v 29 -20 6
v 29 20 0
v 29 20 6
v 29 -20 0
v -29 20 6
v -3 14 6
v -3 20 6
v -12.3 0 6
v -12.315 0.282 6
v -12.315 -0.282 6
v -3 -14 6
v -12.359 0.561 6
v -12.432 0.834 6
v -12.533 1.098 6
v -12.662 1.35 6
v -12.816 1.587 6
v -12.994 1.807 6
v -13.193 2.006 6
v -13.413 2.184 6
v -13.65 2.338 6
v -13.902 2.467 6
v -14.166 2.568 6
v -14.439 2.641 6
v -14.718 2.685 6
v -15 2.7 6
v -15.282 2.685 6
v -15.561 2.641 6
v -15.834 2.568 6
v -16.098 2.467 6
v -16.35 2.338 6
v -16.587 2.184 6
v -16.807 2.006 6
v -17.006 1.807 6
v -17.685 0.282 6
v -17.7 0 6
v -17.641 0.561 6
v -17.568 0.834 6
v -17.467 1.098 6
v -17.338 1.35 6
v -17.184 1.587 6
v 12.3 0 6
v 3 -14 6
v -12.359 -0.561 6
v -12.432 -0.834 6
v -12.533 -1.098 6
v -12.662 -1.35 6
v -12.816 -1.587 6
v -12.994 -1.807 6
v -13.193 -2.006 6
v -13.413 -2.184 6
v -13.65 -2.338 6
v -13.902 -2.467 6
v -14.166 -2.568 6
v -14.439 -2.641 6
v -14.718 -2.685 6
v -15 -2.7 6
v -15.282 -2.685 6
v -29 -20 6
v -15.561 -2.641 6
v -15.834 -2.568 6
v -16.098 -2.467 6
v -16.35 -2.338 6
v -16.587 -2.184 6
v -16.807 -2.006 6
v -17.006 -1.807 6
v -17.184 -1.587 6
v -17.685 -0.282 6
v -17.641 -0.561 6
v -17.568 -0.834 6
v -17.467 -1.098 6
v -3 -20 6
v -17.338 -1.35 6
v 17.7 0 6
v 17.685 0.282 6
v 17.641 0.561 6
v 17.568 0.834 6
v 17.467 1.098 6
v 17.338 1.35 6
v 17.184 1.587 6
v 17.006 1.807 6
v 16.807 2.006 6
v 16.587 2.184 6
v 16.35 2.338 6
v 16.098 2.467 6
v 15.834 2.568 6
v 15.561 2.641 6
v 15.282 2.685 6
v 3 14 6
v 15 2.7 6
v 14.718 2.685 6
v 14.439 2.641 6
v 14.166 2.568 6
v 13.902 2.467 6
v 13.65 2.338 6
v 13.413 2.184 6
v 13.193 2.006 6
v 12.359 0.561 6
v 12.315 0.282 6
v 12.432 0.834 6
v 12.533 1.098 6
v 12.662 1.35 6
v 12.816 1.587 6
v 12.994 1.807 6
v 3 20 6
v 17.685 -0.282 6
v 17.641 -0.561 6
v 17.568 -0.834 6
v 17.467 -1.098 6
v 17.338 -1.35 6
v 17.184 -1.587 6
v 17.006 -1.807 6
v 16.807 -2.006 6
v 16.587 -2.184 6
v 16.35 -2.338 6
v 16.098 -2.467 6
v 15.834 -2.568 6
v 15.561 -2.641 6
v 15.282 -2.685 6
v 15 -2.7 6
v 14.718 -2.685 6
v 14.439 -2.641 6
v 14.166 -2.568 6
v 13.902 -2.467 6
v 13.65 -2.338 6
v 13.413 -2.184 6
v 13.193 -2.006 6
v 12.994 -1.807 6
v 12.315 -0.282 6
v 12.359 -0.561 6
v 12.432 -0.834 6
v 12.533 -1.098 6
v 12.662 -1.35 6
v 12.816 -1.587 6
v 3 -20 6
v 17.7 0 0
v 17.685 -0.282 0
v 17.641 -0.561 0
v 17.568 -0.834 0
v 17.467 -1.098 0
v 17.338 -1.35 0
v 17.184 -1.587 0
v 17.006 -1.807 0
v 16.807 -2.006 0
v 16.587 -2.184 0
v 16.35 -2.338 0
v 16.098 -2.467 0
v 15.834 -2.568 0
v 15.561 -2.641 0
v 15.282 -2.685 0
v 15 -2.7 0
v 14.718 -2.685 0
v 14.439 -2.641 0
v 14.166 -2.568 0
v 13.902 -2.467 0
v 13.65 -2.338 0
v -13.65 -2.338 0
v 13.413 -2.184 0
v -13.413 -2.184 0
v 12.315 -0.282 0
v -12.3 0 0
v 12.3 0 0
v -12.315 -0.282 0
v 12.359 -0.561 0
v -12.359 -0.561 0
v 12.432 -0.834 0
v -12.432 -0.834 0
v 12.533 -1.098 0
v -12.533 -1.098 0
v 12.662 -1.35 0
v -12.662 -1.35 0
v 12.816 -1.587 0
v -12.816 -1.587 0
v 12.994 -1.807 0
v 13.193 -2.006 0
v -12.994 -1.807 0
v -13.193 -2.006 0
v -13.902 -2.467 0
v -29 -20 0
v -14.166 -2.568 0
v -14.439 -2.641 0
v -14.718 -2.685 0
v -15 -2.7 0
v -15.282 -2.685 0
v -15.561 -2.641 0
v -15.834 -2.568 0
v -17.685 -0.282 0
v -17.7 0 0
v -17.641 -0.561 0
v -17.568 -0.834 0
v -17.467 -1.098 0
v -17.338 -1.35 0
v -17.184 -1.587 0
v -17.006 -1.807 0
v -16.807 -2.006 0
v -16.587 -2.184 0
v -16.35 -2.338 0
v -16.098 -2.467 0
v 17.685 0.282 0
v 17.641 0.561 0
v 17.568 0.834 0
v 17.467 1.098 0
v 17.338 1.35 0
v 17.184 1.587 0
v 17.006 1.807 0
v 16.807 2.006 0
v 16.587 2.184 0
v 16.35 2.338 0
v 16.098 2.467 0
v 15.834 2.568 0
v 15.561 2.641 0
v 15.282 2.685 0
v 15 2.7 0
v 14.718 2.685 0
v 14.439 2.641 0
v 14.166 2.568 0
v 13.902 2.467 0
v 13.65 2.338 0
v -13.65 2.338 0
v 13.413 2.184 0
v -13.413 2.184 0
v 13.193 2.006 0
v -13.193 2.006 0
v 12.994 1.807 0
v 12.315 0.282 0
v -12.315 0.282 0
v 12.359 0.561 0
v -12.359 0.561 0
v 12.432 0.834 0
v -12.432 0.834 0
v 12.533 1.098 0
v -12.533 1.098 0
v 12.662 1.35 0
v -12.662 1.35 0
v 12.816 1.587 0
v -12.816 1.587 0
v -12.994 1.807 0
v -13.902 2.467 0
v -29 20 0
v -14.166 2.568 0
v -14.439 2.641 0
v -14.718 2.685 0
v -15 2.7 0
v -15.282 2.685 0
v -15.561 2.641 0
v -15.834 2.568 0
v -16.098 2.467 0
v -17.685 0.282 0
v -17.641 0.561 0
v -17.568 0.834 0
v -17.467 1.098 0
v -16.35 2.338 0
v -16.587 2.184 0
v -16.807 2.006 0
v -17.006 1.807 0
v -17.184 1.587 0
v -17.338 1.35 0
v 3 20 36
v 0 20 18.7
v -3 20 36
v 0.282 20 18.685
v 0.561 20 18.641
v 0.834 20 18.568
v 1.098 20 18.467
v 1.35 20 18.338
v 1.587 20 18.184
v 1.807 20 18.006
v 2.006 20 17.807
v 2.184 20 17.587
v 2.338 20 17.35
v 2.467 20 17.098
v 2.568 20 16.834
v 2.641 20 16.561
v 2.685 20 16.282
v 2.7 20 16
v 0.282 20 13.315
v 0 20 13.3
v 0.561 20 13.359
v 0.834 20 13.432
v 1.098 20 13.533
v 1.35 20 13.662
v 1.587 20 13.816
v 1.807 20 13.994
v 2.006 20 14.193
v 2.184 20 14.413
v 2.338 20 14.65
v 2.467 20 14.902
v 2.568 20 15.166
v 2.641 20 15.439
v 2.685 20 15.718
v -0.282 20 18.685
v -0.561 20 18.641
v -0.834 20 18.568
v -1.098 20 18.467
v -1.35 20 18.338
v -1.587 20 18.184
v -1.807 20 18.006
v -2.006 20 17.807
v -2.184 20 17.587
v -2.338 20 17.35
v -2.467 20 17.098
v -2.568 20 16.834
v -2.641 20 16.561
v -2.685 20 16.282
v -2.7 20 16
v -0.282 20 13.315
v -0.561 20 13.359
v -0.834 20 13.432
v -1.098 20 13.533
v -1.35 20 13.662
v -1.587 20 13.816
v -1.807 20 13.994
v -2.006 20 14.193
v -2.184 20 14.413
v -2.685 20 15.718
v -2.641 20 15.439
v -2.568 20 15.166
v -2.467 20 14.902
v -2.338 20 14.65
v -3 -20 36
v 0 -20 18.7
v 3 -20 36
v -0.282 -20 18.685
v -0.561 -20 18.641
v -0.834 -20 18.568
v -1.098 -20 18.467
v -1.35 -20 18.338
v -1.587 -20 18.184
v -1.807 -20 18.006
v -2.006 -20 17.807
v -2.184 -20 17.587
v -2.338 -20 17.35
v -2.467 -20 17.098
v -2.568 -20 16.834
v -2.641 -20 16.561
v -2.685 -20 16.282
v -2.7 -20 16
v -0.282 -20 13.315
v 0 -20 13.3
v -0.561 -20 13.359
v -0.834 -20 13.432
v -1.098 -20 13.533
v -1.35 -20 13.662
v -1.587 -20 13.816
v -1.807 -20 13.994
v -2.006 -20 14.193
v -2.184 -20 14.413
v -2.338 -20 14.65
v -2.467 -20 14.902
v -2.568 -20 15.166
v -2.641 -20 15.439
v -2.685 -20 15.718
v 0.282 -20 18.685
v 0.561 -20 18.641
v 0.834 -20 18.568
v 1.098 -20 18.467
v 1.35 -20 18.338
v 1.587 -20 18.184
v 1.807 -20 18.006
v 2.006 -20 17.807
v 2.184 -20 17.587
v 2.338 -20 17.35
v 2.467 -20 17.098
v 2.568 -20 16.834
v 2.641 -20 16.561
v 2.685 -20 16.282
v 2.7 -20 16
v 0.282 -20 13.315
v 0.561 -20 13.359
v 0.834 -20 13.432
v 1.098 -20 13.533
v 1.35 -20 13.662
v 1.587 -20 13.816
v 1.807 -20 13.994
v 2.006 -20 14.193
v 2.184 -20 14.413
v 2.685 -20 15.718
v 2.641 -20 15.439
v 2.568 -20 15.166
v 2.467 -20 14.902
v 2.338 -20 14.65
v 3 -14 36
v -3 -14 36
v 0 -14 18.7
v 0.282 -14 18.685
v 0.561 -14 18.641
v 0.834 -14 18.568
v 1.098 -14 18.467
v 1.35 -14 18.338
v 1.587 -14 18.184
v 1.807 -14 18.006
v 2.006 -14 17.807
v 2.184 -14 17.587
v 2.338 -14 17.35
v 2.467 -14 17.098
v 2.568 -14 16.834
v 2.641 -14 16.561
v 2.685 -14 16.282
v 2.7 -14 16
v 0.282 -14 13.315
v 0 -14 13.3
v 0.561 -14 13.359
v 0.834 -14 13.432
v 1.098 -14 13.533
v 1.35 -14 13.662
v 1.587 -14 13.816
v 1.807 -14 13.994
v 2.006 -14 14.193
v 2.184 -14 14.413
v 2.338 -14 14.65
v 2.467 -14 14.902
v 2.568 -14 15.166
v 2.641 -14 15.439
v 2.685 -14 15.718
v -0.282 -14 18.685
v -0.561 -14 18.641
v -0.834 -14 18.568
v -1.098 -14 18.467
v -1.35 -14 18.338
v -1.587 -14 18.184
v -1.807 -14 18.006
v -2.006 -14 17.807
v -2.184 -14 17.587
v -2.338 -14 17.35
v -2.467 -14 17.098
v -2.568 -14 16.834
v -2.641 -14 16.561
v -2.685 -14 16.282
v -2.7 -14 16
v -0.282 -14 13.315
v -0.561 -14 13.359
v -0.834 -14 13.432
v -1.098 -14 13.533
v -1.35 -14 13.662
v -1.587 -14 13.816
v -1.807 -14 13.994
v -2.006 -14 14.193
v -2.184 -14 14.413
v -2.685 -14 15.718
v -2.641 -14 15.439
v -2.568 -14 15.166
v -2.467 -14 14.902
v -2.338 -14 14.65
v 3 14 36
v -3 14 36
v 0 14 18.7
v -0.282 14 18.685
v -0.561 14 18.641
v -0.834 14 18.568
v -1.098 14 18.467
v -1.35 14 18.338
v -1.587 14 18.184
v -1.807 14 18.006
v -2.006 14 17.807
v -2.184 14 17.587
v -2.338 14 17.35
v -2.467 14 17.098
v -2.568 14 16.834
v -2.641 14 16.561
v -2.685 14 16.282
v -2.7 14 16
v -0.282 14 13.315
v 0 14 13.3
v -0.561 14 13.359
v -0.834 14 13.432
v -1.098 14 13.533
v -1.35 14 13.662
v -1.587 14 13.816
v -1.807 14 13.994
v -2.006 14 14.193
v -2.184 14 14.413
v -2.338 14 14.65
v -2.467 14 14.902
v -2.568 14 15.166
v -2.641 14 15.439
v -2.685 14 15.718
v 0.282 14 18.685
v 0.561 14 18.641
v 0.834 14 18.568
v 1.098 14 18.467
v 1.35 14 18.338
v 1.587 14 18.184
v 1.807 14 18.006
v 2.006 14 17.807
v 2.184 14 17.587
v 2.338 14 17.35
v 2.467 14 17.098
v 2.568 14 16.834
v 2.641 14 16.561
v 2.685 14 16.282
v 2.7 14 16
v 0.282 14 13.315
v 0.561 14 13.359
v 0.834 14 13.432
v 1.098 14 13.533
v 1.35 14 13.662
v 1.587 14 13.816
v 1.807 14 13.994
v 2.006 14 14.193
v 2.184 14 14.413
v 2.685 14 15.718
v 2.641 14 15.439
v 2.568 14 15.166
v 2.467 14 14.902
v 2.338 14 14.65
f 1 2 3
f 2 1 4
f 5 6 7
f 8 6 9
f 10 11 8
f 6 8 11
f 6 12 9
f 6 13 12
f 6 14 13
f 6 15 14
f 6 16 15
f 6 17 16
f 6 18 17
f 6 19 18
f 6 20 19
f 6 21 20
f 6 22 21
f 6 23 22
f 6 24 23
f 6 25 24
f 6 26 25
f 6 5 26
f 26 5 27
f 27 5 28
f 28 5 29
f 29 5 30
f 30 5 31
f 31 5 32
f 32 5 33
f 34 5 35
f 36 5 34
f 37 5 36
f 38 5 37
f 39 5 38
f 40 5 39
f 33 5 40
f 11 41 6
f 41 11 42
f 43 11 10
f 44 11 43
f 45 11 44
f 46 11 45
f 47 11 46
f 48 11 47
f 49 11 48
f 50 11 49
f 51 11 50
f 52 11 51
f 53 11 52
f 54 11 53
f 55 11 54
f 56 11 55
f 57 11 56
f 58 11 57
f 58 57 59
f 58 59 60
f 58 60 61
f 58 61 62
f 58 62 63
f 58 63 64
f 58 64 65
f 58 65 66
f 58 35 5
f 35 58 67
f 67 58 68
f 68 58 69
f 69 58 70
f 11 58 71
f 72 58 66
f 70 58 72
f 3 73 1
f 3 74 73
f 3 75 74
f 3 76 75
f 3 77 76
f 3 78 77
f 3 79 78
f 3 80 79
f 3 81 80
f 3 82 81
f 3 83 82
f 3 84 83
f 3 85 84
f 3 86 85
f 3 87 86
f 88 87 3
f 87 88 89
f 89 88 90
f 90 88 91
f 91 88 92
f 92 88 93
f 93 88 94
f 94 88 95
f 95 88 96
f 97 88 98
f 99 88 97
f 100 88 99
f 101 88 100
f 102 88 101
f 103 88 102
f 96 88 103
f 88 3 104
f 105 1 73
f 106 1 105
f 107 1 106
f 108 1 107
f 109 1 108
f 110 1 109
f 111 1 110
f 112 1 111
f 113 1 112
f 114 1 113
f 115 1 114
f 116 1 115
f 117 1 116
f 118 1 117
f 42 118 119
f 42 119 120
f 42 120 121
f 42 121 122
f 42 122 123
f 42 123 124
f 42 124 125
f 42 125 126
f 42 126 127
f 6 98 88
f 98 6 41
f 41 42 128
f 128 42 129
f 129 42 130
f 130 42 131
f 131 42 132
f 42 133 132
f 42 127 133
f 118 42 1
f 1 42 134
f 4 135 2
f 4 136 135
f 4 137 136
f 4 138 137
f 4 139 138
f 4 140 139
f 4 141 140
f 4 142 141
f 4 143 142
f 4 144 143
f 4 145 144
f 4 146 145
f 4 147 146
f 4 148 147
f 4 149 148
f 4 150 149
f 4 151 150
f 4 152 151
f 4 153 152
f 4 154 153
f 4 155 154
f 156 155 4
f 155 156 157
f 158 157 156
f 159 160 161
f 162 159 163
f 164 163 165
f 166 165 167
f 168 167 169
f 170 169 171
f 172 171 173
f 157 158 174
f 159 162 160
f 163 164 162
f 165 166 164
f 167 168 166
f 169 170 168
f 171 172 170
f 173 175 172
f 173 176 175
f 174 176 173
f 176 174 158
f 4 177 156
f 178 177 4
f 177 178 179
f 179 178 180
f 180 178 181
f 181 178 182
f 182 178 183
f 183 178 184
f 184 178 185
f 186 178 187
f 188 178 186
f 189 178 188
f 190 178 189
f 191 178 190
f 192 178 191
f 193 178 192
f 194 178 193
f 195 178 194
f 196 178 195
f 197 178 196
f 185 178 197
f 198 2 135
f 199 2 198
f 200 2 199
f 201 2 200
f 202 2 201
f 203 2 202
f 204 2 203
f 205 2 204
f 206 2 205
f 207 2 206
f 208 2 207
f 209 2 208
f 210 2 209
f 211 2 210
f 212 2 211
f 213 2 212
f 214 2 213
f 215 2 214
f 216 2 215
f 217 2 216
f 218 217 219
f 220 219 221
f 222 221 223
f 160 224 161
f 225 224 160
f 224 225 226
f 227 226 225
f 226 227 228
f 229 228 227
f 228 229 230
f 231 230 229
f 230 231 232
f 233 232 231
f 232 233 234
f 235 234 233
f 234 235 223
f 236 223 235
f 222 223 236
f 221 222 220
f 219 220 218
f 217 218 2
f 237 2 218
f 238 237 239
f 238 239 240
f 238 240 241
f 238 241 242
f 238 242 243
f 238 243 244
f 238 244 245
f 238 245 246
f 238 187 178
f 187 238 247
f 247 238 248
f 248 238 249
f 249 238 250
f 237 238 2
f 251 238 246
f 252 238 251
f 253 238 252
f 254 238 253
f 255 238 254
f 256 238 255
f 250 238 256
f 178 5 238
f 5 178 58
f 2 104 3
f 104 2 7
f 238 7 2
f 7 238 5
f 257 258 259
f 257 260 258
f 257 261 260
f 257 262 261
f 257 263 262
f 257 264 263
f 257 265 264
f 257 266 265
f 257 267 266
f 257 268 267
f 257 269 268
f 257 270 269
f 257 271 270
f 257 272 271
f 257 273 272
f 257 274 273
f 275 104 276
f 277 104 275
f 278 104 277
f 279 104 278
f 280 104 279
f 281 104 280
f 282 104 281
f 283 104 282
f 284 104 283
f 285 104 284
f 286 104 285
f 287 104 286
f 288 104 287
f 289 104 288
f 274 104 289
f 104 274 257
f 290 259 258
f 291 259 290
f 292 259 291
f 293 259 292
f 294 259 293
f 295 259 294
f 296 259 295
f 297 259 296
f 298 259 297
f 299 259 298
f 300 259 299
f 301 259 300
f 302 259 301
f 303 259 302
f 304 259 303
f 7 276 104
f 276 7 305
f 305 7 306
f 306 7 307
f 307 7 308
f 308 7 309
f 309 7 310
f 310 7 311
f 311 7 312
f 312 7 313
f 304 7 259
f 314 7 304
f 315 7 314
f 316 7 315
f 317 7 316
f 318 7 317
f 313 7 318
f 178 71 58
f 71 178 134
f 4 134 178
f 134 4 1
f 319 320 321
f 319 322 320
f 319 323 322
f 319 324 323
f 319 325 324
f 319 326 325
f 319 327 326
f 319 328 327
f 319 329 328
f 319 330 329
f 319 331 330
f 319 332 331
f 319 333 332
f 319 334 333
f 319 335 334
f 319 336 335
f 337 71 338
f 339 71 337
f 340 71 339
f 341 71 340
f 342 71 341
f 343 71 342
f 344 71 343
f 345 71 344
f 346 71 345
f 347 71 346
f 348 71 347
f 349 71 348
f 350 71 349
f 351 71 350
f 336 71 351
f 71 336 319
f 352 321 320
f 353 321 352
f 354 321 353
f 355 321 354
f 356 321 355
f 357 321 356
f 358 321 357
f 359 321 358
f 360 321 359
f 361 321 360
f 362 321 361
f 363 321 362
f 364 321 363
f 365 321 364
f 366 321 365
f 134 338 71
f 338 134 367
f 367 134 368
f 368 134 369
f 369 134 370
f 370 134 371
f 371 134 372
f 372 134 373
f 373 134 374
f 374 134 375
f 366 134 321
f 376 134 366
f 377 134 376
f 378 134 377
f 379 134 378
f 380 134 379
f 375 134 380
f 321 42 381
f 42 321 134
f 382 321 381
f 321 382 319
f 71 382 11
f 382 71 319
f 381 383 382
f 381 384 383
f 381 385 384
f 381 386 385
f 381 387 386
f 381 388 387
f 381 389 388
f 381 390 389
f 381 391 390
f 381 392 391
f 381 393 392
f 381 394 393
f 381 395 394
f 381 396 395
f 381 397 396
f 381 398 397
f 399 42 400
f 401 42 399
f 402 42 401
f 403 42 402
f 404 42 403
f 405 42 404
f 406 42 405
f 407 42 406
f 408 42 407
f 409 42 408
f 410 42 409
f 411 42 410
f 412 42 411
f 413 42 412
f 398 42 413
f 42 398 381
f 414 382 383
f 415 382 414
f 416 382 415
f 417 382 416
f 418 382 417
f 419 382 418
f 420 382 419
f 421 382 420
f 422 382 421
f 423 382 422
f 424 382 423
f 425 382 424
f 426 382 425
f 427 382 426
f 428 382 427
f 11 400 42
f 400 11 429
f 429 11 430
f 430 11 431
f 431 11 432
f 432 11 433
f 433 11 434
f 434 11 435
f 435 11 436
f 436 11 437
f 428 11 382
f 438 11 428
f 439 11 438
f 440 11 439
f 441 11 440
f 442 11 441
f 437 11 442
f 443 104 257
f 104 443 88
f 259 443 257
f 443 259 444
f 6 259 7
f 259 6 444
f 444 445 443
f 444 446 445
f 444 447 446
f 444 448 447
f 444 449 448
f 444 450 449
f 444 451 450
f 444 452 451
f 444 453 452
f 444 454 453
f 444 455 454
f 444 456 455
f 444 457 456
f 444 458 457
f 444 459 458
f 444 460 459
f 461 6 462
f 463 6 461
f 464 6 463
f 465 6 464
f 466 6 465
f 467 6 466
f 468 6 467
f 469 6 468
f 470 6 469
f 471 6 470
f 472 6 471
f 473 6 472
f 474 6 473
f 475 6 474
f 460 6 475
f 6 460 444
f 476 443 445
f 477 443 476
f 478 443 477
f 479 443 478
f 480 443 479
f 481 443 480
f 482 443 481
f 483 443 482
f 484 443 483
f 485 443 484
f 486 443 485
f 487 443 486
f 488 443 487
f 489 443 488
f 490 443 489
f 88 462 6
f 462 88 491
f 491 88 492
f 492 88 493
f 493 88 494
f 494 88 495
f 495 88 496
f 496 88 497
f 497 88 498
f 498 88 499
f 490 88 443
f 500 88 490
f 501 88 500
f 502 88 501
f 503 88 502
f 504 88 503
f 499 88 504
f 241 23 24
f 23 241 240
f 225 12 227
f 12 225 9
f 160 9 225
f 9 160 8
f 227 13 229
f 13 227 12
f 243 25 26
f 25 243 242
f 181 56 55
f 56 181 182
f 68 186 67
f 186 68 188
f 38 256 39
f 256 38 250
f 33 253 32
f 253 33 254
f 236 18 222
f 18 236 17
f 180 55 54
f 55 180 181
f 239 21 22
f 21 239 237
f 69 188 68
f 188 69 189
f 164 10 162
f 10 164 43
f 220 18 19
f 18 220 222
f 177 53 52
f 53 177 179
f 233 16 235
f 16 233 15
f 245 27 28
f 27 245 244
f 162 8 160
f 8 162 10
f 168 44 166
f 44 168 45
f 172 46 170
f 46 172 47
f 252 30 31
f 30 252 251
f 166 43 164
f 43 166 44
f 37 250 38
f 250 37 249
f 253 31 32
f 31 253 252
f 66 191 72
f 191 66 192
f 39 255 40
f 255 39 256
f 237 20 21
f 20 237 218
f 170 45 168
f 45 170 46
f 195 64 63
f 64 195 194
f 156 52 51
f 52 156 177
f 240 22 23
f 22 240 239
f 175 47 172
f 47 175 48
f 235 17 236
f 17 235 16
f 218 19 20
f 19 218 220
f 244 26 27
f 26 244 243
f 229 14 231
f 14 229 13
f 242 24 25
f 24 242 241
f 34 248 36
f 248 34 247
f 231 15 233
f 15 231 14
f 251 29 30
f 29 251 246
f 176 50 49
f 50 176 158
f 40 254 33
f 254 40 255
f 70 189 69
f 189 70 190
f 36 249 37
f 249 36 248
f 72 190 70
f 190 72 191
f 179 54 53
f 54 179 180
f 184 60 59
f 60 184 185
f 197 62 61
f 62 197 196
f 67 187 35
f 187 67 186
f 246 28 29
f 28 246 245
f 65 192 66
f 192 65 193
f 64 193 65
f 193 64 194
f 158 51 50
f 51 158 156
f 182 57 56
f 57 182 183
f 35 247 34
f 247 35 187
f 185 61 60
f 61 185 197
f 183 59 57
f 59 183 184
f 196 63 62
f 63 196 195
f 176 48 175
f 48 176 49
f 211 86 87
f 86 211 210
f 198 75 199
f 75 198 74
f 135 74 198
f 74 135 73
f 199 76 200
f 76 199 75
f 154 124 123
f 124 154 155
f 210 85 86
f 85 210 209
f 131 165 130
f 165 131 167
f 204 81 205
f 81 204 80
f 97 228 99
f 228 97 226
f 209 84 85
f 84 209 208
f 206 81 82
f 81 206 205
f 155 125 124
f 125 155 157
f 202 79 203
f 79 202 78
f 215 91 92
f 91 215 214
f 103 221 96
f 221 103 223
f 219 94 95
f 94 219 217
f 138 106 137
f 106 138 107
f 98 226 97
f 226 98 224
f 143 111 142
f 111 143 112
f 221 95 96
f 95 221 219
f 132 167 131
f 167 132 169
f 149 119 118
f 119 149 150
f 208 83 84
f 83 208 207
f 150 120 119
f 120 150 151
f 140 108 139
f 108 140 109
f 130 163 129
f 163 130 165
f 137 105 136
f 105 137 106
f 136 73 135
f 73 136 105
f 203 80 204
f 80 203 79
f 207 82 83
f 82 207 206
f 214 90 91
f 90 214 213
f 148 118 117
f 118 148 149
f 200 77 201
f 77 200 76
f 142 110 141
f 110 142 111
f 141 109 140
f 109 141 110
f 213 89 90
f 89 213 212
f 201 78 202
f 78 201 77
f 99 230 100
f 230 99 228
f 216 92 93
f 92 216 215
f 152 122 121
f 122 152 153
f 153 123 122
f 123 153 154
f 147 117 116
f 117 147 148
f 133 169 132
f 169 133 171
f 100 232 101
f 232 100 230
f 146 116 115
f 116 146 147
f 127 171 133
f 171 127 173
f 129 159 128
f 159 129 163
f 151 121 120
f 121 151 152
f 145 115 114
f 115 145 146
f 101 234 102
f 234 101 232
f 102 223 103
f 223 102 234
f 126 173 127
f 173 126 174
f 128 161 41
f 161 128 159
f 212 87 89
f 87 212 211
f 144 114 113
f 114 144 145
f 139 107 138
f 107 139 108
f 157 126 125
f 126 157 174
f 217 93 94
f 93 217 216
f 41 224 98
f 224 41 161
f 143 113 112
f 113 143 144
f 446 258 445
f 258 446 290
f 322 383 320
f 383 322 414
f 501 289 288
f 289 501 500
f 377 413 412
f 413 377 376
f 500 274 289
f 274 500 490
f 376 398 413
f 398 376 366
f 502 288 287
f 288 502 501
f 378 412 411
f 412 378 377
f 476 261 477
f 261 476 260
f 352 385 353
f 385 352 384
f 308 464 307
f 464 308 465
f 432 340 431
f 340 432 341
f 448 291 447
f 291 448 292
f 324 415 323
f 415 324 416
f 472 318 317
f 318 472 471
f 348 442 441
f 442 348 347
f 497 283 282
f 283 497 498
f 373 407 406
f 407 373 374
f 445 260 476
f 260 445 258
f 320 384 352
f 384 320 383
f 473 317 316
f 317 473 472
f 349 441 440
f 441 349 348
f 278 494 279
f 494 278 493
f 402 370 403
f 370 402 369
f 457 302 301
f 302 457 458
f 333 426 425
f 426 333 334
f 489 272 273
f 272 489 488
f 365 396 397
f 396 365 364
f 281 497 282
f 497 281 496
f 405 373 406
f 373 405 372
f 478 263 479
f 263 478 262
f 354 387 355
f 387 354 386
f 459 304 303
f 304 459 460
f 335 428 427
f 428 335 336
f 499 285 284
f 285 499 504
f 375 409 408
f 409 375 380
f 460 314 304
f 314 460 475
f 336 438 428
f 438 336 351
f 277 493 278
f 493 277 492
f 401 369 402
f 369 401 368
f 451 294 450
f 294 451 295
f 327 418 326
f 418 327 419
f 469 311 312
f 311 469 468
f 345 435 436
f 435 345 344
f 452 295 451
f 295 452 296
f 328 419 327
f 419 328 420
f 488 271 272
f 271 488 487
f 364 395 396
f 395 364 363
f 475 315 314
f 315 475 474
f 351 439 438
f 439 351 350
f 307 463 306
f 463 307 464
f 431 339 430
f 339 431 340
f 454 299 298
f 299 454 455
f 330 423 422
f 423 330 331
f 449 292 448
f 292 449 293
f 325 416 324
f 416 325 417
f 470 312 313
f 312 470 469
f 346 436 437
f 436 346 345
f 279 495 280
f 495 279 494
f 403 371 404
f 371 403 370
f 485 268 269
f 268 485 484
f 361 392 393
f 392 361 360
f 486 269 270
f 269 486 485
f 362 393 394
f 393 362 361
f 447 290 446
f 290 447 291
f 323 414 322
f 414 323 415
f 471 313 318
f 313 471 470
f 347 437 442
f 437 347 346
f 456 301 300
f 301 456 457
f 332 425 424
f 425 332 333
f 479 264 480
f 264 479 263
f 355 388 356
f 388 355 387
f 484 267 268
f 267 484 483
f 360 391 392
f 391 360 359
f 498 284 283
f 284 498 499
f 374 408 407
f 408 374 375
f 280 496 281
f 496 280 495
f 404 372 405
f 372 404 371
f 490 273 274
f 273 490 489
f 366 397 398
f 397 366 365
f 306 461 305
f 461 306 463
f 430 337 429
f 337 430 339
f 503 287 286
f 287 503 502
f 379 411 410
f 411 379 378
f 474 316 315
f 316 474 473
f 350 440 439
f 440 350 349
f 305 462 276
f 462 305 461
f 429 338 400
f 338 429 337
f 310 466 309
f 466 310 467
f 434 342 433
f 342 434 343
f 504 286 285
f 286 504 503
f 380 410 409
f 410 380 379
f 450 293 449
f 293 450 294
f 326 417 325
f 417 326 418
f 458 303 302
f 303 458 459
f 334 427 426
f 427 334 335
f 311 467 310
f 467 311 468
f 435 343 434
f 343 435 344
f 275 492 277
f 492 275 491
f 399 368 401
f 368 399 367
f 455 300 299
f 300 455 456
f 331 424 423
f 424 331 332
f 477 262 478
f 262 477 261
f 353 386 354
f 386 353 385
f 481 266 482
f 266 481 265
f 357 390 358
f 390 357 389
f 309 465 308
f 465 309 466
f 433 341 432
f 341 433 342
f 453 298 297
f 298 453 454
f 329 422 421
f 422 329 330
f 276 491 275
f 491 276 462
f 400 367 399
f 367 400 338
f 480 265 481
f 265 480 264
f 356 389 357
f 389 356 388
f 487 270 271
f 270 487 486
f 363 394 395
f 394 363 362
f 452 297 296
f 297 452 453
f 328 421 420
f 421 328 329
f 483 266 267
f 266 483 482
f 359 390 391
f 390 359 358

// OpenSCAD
// Clevis mounting bracket for M5 pin.
$fn = 60;
eps = 0.02;
opening = 28;
ear_h = 32;
base_l = 58;
base_w = opening + 12;
base_t = 6;
ear_t = 6;
difference() {
    union() {
        translate([-base_l / 2, -base_w / 2, 0]) cube([base_l, base_w, base_t]);
        translate([-ear_t / 2, -base_w / 2, base_t - 2]) cube([ear_t, ear_t, ear_h]);
        translate([-ear_t / 2, base_w / 2 - ear_t, base_t - 2]) cube([ear_t, ear_t, ear_h]);
    }
    for (x = [-15, 15]) translate([x, 0, -eps]) cylinder(d = 5.4, h = base_t + 2 * eps);
    translate([0, -base_w / 2 - eps, ear_h / 2]) rotate([-90, 0, 0]) cylinder(d = 5.4, h = base_w + 2 * eps);
}
